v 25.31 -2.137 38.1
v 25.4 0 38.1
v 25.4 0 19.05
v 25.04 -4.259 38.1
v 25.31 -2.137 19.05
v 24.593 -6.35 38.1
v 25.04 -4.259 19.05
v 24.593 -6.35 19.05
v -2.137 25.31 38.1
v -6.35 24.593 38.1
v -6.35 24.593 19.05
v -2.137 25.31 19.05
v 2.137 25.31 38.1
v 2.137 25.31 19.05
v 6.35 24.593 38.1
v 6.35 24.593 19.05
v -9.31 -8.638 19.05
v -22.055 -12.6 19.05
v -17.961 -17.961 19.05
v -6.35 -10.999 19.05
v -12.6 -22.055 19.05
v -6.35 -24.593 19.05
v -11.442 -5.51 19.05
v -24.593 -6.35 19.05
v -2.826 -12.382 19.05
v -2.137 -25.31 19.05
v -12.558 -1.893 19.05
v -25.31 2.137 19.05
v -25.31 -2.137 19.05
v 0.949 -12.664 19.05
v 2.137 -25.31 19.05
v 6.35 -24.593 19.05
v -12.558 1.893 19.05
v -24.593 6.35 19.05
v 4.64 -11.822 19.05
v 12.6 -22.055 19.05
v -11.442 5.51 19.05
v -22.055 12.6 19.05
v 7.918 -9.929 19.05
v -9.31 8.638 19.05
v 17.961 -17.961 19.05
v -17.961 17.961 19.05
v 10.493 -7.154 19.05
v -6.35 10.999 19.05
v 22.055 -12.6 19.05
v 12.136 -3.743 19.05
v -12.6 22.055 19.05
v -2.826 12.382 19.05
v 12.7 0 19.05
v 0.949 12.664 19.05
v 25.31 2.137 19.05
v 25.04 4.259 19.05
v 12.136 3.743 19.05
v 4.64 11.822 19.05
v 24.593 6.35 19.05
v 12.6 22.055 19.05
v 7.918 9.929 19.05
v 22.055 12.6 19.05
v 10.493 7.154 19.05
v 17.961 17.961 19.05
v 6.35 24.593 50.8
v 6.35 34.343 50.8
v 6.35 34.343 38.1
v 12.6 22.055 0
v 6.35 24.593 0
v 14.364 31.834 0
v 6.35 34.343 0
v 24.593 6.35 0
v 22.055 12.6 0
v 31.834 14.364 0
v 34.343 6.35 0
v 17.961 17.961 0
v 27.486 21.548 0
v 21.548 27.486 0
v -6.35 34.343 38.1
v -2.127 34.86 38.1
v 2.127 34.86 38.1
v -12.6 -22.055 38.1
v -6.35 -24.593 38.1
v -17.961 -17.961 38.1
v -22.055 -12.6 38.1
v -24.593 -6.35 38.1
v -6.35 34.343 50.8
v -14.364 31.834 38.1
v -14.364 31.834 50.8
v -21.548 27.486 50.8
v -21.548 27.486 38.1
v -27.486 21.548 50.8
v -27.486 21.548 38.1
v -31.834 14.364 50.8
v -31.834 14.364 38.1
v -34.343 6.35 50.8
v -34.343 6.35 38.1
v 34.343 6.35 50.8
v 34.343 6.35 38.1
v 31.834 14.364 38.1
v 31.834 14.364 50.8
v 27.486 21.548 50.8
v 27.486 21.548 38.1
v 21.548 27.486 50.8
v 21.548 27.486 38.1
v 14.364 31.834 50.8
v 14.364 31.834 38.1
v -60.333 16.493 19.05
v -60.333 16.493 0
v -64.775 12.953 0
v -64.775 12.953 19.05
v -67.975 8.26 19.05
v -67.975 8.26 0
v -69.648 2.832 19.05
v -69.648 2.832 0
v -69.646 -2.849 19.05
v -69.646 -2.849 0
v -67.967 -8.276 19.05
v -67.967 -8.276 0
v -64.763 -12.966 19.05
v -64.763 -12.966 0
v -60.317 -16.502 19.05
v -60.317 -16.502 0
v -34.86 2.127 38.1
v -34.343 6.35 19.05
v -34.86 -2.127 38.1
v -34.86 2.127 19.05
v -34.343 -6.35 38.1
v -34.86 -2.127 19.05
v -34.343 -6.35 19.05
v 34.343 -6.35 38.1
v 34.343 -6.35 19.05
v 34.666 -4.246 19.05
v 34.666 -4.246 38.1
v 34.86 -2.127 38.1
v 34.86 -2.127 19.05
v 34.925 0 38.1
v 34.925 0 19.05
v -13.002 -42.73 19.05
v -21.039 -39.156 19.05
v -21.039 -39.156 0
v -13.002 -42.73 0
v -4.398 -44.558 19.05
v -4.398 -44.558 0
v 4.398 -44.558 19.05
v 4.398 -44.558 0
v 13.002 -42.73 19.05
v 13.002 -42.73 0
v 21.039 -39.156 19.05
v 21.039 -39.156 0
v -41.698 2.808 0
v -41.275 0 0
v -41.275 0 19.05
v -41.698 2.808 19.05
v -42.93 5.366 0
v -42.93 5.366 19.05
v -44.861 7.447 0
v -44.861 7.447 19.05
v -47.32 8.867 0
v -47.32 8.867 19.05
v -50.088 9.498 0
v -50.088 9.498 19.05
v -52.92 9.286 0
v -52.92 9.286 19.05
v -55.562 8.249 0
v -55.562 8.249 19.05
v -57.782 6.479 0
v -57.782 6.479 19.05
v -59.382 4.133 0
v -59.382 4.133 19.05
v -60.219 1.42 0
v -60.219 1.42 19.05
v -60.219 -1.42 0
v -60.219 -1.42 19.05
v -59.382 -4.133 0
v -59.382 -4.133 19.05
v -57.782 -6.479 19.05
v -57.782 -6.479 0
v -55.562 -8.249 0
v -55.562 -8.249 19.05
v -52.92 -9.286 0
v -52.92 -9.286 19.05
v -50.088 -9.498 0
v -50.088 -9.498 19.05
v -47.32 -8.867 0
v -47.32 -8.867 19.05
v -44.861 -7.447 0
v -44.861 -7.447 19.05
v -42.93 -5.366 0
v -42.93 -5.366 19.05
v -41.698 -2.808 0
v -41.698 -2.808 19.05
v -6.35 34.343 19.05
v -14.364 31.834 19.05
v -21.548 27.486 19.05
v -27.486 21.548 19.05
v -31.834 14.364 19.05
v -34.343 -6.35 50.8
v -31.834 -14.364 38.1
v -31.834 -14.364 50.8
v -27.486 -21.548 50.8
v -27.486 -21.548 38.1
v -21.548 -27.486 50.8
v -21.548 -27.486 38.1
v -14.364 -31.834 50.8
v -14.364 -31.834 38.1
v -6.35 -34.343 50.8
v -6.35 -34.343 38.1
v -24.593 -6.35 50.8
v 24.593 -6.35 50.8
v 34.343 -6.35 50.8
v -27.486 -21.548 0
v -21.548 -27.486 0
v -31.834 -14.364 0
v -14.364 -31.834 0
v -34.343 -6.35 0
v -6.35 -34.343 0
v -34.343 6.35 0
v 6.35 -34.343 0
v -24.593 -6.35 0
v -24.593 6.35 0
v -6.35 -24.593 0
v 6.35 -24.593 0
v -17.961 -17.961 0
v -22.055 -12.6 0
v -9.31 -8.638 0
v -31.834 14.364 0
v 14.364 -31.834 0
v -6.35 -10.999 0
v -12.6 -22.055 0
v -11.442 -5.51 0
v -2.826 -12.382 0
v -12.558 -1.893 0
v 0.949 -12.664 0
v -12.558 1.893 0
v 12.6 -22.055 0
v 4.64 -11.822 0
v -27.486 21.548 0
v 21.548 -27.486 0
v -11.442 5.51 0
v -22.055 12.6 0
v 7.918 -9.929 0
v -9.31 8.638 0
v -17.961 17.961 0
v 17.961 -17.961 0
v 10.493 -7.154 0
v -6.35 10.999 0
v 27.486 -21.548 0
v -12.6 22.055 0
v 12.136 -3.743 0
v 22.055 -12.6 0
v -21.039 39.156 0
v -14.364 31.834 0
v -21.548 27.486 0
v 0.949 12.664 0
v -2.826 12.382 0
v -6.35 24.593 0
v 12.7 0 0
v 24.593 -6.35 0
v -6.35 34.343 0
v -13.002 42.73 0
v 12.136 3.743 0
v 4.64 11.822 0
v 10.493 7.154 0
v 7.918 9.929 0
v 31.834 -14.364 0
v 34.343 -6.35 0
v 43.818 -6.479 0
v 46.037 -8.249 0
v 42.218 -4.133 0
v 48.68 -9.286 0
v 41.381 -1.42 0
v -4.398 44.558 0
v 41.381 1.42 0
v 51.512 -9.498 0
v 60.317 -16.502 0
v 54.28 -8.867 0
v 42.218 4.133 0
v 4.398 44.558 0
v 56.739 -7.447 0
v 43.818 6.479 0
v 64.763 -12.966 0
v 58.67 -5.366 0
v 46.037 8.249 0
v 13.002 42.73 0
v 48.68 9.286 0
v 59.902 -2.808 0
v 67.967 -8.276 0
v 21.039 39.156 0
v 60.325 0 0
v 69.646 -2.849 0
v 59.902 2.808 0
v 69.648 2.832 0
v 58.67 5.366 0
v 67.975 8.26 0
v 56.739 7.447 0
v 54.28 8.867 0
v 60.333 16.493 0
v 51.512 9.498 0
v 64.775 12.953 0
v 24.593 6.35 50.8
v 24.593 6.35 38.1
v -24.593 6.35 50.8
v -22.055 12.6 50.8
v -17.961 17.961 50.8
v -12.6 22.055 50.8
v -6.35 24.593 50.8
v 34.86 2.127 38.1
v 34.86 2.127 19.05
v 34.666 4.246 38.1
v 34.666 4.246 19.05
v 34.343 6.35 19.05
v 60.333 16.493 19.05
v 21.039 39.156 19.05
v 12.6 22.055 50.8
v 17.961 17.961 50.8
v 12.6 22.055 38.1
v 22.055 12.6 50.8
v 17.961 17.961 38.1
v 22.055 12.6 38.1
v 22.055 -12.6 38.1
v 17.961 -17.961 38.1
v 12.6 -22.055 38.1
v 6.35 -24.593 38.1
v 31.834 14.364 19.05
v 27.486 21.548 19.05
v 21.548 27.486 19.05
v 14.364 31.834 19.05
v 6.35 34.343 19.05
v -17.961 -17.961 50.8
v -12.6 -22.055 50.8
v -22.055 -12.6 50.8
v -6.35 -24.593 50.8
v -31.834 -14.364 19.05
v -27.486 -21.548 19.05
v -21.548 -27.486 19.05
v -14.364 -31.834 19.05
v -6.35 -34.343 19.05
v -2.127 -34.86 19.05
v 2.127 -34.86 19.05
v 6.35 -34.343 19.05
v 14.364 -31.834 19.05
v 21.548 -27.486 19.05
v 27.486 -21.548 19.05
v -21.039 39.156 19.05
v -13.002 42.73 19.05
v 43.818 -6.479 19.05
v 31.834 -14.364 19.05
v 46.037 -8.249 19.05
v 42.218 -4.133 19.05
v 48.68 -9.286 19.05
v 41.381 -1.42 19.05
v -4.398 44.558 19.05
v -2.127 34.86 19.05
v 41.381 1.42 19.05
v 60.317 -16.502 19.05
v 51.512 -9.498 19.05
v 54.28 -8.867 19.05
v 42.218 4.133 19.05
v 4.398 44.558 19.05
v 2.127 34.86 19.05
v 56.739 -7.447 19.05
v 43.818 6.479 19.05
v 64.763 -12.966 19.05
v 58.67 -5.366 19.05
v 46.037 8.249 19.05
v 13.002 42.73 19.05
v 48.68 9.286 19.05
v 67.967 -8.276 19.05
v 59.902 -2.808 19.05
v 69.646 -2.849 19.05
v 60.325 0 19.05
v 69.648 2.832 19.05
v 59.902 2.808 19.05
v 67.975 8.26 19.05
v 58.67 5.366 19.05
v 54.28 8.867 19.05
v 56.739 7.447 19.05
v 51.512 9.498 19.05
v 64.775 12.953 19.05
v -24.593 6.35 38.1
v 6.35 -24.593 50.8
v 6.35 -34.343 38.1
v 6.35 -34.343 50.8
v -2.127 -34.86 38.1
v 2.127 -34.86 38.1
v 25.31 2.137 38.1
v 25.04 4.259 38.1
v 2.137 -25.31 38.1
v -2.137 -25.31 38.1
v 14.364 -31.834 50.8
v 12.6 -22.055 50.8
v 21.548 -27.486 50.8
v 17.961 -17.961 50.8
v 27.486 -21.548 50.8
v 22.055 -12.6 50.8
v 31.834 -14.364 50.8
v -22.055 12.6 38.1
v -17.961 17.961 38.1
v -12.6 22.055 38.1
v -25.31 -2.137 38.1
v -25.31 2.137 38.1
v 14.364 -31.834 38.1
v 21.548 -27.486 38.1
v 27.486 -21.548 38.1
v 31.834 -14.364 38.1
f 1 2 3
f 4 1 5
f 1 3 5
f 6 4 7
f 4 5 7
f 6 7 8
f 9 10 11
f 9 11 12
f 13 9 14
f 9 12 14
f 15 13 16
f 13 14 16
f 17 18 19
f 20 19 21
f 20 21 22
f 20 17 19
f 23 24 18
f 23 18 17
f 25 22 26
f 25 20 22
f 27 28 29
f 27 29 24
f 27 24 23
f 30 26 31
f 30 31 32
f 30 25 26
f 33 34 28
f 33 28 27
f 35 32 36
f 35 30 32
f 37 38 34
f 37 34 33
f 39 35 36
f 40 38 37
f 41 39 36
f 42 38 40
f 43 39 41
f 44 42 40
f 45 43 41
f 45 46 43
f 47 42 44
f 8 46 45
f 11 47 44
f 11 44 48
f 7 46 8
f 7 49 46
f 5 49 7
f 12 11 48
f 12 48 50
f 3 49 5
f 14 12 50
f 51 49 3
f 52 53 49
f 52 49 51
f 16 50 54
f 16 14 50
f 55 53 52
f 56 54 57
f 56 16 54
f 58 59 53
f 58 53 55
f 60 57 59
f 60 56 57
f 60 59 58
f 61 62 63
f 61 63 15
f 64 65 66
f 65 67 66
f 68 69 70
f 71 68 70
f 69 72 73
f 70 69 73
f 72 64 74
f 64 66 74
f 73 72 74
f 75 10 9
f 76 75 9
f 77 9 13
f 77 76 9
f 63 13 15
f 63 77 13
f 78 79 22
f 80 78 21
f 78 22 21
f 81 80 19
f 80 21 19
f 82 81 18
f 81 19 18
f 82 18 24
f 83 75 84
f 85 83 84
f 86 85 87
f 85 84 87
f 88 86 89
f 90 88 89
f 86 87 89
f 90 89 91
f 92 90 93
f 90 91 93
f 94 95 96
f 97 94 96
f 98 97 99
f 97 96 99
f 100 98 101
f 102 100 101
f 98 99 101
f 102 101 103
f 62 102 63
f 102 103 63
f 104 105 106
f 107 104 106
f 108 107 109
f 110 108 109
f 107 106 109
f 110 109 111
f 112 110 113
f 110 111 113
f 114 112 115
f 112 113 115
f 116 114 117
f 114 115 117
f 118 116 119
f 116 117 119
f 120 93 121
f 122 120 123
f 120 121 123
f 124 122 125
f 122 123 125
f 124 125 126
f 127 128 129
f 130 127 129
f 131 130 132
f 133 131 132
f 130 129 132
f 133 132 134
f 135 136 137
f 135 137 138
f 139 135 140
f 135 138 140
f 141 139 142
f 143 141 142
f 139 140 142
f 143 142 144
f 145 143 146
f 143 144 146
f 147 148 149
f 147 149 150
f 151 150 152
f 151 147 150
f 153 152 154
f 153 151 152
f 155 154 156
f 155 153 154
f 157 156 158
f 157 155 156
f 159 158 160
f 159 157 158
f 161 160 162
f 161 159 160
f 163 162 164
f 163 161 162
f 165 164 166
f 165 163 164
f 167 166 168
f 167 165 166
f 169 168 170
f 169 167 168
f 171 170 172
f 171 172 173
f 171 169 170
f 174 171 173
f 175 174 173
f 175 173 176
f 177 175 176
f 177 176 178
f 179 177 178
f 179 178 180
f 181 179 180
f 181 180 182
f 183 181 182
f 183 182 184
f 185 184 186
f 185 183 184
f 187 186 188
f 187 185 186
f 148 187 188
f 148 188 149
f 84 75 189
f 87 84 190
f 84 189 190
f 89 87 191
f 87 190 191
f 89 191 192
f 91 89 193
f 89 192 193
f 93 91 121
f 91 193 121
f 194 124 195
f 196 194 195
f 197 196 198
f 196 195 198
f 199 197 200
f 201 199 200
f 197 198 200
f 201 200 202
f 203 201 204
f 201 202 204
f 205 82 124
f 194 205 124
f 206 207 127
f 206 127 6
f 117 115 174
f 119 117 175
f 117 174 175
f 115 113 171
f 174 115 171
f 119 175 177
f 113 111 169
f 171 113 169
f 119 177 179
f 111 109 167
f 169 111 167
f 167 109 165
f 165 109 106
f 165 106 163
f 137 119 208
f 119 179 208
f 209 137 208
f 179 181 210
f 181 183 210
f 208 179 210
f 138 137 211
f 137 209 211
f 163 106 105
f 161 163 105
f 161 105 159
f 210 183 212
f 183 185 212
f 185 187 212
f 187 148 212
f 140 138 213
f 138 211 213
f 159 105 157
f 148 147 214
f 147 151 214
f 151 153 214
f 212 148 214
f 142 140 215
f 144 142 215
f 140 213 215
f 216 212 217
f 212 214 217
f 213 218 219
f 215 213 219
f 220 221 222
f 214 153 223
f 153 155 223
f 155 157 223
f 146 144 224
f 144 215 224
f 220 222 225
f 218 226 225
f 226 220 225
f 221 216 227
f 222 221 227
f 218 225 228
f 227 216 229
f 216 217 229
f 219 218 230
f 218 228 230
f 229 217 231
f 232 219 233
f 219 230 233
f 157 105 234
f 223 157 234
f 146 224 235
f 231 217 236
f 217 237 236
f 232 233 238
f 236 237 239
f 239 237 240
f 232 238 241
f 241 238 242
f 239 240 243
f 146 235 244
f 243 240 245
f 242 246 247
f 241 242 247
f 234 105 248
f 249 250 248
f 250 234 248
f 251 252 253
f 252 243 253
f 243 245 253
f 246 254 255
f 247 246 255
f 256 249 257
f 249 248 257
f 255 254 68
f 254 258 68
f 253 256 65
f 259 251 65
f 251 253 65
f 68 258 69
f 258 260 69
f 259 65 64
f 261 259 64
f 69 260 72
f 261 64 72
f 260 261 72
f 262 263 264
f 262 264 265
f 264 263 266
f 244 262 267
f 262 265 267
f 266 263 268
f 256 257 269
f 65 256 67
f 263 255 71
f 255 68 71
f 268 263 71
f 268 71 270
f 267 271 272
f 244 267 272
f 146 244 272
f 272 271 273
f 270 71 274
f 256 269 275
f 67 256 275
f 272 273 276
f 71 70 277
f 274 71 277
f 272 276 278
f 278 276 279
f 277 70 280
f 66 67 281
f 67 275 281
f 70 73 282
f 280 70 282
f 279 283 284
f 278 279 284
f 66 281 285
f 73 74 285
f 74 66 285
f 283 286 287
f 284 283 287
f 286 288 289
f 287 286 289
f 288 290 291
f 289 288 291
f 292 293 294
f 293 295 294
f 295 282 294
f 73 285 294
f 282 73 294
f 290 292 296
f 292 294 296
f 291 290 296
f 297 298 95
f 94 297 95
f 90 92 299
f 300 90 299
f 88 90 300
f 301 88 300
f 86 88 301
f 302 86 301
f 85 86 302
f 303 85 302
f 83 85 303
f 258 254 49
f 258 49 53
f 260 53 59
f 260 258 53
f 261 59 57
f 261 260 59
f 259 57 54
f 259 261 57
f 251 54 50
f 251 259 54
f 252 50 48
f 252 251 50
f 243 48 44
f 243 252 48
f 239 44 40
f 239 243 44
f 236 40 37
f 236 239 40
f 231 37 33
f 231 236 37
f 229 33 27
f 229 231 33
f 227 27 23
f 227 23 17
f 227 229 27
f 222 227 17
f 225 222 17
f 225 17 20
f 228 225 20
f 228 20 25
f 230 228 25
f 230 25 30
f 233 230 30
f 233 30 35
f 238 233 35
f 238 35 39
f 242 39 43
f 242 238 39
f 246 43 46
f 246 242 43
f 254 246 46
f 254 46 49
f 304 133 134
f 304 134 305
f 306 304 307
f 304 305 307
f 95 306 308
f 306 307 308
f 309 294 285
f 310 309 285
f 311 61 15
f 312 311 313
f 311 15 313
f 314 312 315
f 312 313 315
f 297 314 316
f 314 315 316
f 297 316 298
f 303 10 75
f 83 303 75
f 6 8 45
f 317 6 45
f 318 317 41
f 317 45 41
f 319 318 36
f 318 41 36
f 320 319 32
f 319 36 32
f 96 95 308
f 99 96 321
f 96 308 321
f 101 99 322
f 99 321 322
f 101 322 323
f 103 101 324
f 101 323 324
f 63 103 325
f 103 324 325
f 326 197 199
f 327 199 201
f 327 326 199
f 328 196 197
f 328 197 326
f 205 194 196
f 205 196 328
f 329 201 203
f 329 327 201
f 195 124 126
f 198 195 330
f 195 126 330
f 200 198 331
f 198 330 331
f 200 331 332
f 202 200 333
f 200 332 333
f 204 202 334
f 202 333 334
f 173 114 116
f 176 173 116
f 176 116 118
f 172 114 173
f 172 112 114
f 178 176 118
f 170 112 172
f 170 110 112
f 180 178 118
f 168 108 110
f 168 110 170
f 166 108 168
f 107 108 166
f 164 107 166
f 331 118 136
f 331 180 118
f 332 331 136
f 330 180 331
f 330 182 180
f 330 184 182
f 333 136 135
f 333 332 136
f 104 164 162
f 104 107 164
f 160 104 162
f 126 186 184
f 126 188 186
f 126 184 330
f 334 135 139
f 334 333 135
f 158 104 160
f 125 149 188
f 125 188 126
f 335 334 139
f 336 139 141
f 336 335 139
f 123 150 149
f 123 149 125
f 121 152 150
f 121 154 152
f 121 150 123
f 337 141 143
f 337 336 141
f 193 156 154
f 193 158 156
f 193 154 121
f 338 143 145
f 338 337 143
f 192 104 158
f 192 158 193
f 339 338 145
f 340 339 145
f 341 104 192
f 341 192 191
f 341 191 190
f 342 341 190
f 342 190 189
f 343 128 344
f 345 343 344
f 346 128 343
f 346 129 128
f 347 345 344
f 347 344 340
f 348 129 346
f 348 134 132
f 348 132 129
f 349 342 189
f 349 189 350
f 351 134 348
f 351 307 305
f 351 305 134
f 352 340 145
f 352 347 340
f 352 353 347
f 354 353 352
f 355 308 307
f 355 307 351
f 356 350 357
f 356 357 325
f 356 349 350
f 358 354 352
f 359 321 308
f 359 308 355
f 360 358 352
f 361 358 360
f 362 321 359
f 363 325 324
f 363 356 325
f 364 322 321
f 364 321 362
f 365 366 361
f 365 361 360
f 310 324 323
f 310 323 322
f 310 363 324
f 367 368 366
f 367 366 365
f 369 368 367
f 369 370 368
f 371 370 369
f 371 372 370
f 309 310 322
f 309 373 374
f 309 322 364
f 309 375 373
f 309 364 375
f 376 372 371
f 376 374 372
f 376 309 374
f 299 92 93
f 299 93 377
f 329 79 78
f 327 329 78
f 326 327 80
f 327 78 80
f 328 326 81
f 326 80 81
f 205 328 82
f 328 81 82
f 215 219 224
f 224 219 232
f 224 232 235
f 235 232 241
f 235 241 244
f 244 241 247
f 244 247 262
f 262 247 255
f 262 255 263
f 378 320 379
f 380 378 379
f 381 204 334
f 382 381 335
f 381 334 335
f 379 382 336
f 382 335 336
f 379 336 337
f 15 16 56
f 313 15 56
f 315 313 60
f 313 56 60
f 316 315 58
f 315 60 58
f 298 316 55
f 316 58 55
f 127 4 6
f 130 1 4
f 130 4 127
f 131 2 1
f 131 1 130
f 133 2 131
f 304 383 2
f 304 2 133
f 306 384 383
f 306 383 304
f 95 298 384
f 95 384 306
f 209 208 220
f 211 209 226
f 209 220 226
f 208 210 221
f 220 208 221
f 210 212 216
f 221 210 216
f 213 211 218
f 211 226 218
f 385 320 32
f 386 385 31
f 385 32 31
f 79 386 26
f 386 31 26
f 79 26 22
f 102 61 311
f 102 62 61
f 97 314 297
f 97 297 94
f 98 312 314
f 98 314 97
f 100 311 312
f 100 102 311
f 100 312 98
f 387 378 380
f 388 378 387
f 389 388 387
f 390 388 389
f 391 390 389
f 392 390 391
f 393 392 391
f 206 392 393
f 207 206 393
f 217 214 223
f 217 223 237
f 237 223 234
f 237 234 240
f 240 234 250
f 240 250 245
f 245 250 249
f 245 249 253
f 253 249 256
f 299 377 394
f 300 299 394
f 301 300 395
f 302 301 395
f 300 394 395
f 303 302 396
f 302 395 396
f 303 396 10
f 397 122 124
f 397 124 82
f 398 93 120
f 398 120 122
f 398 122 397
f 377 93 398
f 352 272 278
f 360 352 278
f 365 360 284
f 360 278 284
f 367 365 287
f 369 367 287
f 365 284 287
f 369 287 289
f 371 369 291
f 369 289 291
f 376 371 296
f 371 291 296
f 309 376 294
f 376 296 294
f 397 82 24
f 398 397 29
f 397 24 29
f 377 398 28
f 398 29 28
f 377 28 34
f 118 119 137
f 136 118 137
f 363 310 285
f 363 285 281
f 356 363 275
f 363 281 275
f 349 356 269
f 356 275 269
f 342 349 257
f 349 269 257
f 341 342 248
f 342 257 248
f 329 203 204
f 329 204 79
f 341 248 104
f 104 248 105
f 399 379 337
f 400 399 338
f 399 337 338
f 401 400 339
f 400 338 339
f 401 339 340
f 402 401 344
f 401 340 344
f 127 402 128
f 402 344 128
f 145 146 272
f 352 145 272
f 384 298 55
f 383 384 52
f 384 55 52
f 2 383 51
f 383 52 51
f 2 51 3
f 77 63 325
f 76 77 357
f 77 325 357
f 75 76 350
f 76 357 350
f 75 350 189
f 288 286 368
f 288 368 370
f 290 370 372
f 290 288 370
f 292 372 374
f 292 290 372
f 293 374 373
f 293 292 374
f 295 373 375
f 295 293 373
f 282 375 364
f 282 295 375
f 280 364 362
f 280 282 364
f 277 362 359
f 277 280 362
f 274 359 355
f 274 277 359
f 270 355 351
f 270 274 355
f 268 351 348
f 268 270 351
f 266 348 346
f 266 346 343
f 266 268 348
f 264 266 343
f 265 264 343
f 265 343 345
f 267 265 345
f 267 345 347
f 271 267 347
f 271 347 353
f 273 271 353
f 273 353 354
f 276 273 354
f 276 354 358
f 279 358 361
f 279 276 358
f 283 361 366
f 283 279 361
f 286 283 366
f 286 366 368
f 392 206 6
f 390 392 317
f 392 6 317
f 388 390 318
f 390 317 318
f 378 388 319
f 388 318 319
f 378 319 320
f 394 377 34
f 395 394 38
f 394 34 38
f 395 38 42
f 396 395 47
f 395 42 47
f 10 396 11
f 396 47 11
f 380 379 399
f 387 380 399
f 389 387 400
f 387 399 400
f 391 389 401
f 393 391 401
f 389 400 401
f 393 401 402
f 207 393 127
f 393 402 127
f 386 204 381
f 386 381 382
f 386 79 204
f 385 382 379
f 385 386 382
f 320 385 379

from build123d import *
from build123d import SkipClean  # not in build123d's __all__

# Parameters (mm, degrees)
F1_DEPTH = 38.1
F0_R     = 9.525
F2_DEPTH = 19.05
F0_R_2   = 12.7
F3_DEPTH = 19.05
F4_DEPTH = 50.8


with BuildPart() as f1:
    # F0 (on Top) → F1 (new body)
    with BuildSketch(Plane.XY):
        with BuildLine():
            ThreePointArc((6.35, 24.5934442484), (17.9605122421, 17.9605122421), (24.5934442484, 6.35))
            Line((24.5934442484, 6.35), (34.3428758988, 6.35))
            ThreePointArc((34.3428758988, 6.35), (24.6957043329, 24.6957043329), (6.35, 34.3428758988))
            Line((6.35, 34.3428758988), (6.35, 24.5934442484))
        make_face()
        with BuildLine():
            ThreePointArc((-6.35, 24.5934442484), (0, 25.4), (6.35, 24.5934442484))
            Line((6.35, 24.5934442484), (6.35, 34.3428758988))
            ThreePointArc((6.35, 34.3428758988), (0, 34.925), (-6.35, 34.3428758988))
            Line((-6.35, 34.3428758988), (-6.35, 24.5934442484))
        make_face()
        with BuildLine():
            ThreePointArc((-24.5934442484, 6.35), (-17.9605122421, 17.9605122421), (-6.35, 24.5934442484))
            Line((-6.35, 24.5934442484), (-6.35, 34.3428758988))
            ThreePointArc((-6.35, 34.3428758988), (-24.6957043329, 24.6957043329), (-34.3428758988, 6.35))
            Line((-34.3428758988, 6.35), (-24.5934442484, 6.35))
        make_face()
        with BuildLine():
            ThreePointArc((-24.5934442484, -6.35), (-25.4, 0), (-24.5934442484, 6.35))
            Line((-24.5934442484, 6.35), (-34.3428758988, 6.35))
            ThreePointArc((-34.3428758988, 6.35), (-34.925, 0), (-34.3428758988, -6.35))
            Line((-34.3428758988, -6.35), (-24.5934442484, -6.35))
        make_face()
        with BuildLine():
            Line((-6.35, -34.3428758988), (-6.35, -24.5934442484))
            ThreePointArc((-6.35, -24.5934442484), (-17.9605122421, -17.9605122421), (-24.5934442484, -6.35))
            Line((-24.5934442484, -6.35), (-34.3428758988, -6.35))
            ThreePointArc((-34.3428758988, -6.35), (-24.6957043329, -24.6957043329), (-6.35, -34.3428758988))
        make_face()
        with BuildLine():
            Line((6.35, -34.3428758988), (6.35, -24.5934442484))
            ThreePointArc((6.35, -24.5934442484), (0, -25.4), (-6.35, -24.5934442484))
            Line((-6.35, -24.5934442484), (-6.35, -34.3428758988))
            ThreePointArc((-6.35, -34.3428758988), (0, -34.925), (6.35, -34.3428758988))
        make_face()
        with BuildLine():
            Line((34.3428758988, -6.35), (24.5934442484, -6.35))
            ThreePointArc((24.5934442484, -6.35), (17.9605122421, -17.9605122421), (6.35, -24.5934442484))
            Line((6.35, -24.5934442484), (6.35, -34.3428758988))
            ThreePointArc((6.35, -34.3428758988), (24.6957043329, -24.6957043329), (34.3428758988, -6.35))
        make_face()
        with BuildLine():
            ThreePointArc((24.5934442484, 6.35), (25.1975542852, 3.2005090291), (25.4, 0))
            ThreePointArc((25.4, 0), (25.1975542852, -3.2005090291), (24.5934442484, -6.35))
            Line((24.5934442484, -6.35), (34.3428758988, -6.35))
            ThreePointArc((34.3428758988, -6.35), (34.7791644937, -3.1883133656), (34.925, 0))
            ThreePointArc((34.925, 0), (34.7791644937, 3.1883133656), (34.3428758988, 6.35))
            Line((34.3428758988, 6.35), (24.5934442484, 6.35))
        make_face()
    extrude(amount=F1_DEPTH)

    # F0 (on Top) → F2 (join)
    with BuildSketch(Plane.XY):
        with BuildLine():
            Line((-60.3174545175, -16.5021301071), (-21.0389726486, -39.1556398223))
            ThreePointArc((-21.0389726486, -39.1556398223), (0, -44.7878622326), (21.0389726486, -39.1556398223))
            Line((21.0389726486, -39.1556398223), (60.3174545175, -16.5021301071))
            ThreePointArc((60.3174545175, -16.5021301071), (69.8600459872, -0.008704331), (60.3325297632, 16.4934343301))
            Line((60.3325297632, 16.4934343301), (21.0389726486, 39.1556398223))
            ThreePointArc((21.0389726486, 39.1556398223), (0, 44.787862505), (-21.0389726486, 39.1556398223))
            Line((-21.0389726486, 39.1556398223), (-60.332536636, 16.4934343301))
            ThreePointArc((-60.332536636, 16.4934343301), (-69.8600525487, -0.0087063185), (-60.3174545175, -16.5021301071))
        make_face()
        with BuildLine():
            ThreePointArc((6.35, 34.3428758988), (24.6957043329, 24.6957043329), (34.3428758988, 6.35))
            ThreePointArc((34.3428758988, 6.35), (34.7791644937, 3.1883133656), (34.925, 0))
            ThreePointArc((34.925, 0), (34.7791644937, -3.1883133656), (34.3428758988, -6.35))
            ThreePointArc((34.3428758988, -6.35), (24.6957043329, -24.6957043329), (6.35, -34.3428758988))
            ThreePointArc((6.35, -34.3428758988), (0, -34.925), (-6.35, -34.3428758988))
            ThreePointArc((-6.35, -34.3428758988), (-24.6957043329, -24.6957043329), (-34.3428758988, -6.35))
            ThreePointArc((-34.3428758988, -6.35), (-34.925, 0), (-34.3428758988, 6.35))
            ThreePointArc((-34.3428758988, 6.35), (-24.6957043329, 24.6957043329), (-6.35, 34.3428758988))
            ThreePointArc((-6.35, 34.3428758988), (0, 34.925), (6.35, 34.3428758988))
        make_face(mode=Mode.SUBTRACT)
        with Locations((-50.7999965718, 5.9441e-06)):
            Circle(F0_R, mode=Mode.SUBTRACT)
        with Locations((50.7999931345, 3.9617e-06)):
            Circle(F0_R, mode=Mode.SUBTRACT)
    extrude(amount=F2_DEPTH)

    # F0 (on Top) → F3 (join)
    with BuildSketch(Plane.XY):
        with BuildLine():
            ThreePointArc((24.5934442484, -6.35), (25.1975542852, -3.2005090291), (25.4, 0))
            ThreePointArc((25.4, 0), (25.1975542852, 3.2005090291), (24.5934442484, 6.35))
            ThreePointArc((24.5934442484, 6.35), (17.9605122421, 17.9605122421), (6.35, 24.5934442484))
            ThreePointArc((6.35, 24.5934442484), (0, 25.4), (-6.35, 24.5934442484))
            ThreePointArc((-6.35, 24.5934442484), (-17.9605122421, 17.9605122421), (-24.5934442484, 6.35))
            ThreePointArc((-24.5934442484, 6.35), (-25.4, 0), (-24.5934442484, -6.35))
            ThreePointArc((-24.5934442484, -6.35), (-17.9605122421, -17.9605122421), (-6.35, -24.5934442484))
            ThreePointArc((-6.35, -24.5934442484), (0, -25.4), (6.35, -24.5934442484))
            ThreePointArc((6.35, -24.5934442484), (17.9605122421, -17.9605122421), (24.5934442484, -6.35))
        make_face()
        Circle(F0_R_2, mode=Mode.SUBTRACT)
    extrude(amount=F3_DEPTH)

    # F0 (on Top) → F4 (join)
    with BuildSketch(Plane.XY):
        with BuildLine():
            ThreePointArc((-24.5934442484, 6.35), (-17.9605122421, 17.9605122421), (-6.35, 24.5934442484))
            Line((-6.35, 24.5934442484), (-6.35, 34.3428758988))
            ThreePointArc((-6.35, 34.3428758988), (-24.6957043329, 24.6957043329), (-34.3428758988, 6.35))
            Line((-34.3428758988, 6.35), (-24.5934442484, 6.35))
        make_face()
        with BuildLine():
            ThreePointArc((6.35, 24.5934442484), (17.9605122421, 17.9605122421), (24.5934442484, 6.35))
            Line((24.5934442484, 6.35), (34.3428758988, 6.35))
            ThreePointArc((34.3428758988, 6.35), (24.6957043329, 24.6957043329), (6.35, 34.3428758988))
            Line((6.35, 34.3428758988), (6.35, 24.5934442484))
        make_face()
        with BuildLine():
            Line((34.3428758988, -6.35), (24.5934442484, -6.35))
            ThreePointArc((24.5934442484, -6.35), (17.9605122421, -17.9605122421), (6.35, -24.5934442484))
            Line((6.35, -24.5934442484), (6.35, -34.3428758988))
            ThreePointArc((6.35, -34.3428758988), (24.6957043329, -24.6957043329), (34.3428758988, -6.35))
        make_face()
        with BuildLine():
            Line((-6.35, -34.3428758988), (-6.35, -24.5934442484))
            ThreePointArc((-6.35, -24.5934442484), (-17.9605122421, -17.9605122421), (-24.5934442484, -6.35))
            Line((-24.5934442484, -6.35), (-34.3428758988, -6.35))
            ThreePointArc((-34.3428758988, -6.35), (-24.6957043329, -24.6957043329), (-6.35, -34.3428758988))
        make_face()
    with SkipClean():  # cleaning this boolean's faces spoils the solid; the shape is the same uncleaned
        extrude(amount=F4_DEPTH)


solid = f1.part
